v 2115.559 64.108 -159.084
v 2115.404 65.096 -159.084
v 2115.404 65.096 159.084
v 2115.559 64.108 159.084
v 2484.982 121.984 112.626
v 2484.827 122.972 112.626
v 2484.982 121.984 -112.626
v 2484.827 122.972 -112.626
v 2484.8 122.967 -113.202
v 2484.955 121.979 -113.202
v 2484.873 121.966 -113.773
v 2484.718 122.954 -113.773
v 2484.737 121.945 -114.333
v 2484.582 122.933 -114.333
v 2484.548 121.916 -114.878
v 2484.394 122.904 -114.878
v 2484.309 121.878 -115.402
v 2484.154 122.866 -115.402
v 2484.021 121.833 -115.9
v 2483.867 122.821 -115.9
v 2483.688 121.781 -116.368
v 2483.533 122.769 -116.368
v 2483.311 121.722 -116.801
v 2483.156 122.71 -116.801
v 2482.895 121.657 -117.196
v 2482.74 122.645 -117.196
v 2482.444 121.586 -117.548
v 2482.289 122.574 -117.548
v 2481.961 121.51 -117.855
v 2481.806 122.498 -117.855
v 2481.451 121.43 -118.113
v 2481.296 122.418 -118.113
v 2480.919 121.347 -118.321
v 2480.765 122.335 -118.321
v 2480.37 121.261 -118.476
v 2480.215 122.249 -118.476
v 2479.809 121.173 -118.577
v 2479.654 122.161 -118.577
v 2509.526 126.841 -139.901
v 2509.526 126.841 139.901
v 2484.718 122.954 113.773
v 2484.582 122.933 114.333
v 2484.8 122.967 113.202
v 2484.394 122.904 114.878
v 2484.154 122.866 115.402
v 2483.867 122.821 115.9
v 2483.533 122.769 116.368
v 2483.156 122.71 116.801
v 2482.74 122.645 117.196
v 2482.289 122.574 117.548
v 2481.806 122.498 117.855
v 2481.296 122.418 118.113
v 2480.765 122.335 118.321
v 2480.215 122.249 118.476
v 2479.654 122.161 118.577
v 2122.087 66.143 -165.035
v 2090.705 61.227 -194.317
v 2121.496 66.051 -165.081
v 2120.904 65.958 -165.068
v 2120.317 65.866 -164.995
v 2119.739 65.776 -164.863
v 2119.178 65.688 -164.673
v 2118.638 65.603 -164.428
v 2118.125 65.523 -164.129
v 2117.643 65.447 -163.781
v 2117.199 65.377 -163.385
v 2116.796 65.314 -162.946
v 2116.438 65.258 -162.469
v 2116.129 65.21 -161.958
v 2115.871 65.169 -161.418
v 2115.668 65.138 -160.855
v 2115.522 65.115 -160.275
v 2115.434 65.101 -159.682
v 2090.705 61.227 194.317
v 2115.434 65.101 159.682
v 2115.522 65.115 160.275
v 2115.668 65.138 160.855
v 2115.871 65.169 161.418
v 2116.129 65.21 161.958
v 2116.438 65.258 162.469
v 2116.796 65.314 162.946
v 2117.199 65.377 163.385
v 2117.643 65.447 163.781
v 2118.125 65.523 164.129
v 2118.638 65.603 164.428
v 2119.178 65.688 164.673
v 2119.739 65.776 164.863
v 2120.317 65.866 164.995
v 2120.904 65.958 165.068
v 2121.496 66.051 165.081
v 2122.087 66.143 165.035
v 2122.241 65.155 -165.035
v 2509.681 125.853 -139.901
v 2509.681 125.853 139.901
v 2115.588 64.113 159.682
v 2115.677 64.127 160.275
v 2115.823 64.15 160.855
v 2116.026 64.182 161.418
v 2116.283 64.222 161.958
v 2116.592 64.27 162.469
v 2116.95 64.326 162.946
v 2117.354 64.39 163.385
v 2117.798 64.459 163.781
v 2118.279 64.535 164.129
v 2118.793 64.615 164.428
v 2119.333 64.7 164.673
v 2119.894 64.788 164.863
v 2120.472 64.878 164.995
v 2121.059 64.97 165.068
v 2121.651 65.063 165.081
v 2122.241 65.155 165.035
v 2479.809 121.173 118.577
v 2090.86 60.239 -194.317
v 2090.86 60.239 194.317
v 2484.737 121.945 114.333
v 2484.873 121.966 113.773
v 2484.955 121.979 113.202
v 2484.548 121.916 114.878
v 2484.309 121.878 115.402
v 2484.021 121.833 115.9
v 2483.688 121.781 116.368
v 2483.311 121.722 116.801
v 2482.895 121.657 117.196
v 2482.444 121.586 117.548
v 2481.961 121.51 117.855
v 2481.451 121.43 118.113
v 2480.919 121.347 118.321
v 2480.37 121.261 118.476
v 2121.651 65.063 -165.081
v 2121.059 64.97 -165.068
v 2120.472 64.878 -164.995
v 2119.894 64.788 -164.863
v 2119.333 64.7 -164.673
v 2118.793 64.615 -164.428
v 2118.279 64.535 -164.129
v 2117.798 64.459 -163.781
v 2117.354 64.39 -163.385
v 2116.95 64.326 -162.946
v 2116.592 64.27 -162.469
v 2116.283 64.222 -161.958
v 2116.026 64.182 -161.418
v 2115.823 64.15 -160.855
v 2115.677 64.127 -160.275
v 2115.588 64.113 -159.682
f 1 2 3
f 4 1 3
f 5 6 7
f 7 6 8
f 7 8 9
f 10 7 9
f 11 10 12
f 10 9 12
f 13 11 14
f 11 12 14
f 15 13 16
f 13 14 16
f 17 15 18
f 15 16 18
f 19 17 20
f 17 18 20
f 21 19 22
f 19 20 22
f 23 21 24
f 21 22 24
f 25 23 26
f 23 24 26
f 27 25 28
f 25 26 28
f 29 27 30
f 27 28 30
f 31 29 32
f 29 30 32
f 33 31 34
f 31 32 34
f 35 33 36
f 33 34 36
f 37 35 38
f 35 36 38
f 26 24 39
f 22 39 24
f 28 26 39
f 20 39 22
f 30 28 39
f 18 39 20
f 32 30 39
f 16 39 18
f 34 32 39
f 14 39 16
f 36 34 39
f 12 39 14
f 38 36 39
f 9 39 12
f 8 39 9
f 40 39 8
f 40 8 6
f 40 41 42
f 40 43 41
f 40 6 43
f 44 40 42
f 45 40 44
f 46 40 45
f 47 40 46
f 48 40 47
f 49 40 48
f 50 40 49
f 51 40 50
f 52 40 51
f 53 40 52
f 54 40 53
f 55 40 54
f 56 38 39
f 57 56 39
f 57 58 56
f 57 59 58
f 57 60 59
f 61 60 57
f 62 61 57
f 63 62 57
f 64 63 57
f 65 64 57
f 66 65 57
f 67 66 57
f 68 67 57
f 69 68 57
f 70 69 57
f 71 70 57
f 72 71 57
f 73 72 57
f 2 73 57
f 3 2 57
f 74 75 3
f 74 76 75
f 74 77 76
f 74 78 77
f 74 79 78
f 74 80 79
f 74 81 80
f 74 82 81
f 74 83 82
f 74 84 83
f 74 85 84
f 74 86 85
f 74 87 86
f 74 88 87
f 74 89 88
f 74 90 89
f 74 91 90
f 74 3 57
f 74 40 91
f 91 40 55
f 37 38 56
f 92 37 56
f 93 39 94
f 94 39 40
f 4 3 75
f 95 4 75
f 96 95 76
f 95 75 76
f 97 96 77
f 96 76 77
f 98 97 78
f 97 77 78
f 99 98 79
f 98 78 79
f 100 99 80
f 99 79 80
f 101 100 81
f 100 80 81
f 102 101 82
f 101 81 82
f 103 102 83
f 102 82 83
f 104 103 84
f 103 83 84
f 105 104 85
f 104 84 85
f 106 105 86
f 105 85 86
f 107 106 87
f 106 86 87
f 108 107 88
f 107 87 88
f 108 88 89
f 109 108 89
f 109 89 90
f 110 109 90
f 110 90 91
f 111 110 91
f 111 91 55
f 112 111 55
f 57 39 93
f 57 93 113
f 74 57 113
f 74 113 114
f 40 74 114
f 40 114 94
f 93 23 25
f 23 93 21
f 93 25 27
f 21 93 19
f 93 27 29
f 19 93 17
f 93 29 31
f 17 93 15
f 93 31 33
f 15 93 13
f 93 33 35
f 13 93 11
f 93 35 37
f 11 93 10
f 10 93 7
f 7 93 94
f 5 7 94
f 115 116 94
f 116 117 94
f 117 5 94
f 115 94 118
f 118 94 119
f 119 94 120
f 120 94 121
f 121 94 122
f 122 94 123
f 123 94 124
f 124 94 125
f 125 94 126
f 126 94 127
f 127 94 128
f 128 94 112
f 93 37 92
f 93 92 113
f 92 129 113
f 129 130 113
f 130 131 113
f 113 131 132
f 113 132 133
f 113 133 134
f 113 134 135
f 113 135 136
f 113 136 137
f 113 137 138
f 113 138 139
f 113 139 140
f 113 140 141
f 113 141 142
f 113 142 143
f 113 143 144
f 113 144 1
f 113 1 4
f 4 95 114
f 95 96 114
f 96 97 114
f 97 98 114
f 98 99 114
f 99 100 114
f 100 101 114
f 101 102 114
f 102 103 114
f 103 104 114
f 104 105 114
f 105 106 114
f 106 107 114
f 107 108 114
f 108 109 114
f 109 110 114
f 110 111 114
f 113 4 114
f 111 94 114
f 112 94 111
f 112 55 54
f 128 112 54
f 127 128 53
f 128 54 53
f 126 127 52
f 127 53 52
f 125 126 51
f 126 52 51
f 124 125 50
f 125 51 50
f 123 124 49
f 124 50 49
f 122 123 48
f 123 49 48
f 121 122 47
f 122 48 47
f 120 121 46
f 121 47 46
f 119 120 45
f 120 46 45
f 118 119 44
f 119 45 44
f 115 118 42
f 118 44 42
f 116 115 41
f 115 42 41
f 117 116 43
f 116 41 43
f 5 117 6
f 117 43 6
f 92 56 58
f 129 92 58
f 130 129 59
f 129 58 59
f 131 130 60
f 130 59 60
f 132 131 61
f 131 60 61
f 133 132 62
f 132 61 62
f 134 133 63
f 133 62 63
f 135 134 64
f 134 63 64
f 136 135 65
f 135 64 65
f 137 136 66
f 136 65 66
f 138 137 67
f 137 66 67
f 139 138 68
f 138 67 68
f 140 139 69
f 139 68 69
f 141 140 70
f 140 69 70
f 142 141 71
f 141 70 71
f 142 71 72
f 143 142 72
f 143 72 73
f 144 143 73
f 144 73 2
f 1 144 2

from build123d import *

# Parameters (mm, degrees)
BOSS_EXTRUDE1_DEPTH = 1


with BuildPart() as part:
    # Sketch1 → Boss-Extrude1 (new body)
    with BuildSketch(Plane(origin=(40.721862841, -259.93142883, 0), x_dir=(0.987949588, 0.154776003, 0), z_dir=(0.154776003, -0.987949588, 0))):
        Polygon((2498.917023581, -58.444774641), (2498.917023581, -139.900786314), (2074.988000168, -194.317166252), (2074.988000168, 194.317166252), (2498.917023581, 139.900786314), (2498.917023581, 58.444774641), align=None)
        with BuildLine():
            Line((2473.917023581, -58.444774641), (2473.917023581, -112.625661461))
            ThreePointArc((2473.917023581, -112.625661461), (2472.421655996, -116.589029575), (2468.680927979, -118.57683362))
            Line((2468.680927979, -118.57683362), (2106.751904566, -165.034769173))
            ThreePointArc((2106.751904566, -165.034769173), (2102.024632054, -163.588229428), (2099.988000168, -159.083597013))
            Line((2099.988000168, -159.083597013), (2099.988000168, 159.083597013))
            ThreePointArc((2099.988000168, 159.083597013), (2102.024632054, 163.588229428), (2106.751904566, 165.034769173))
            Line((2106.751904566, 165.034769173), (2468.680927979, 118.57683362))
            ThreePointArc((2468.680927979, 118.57683362), (2472.421655996, 116.589029575), (2473.917023581, 112.625661461))
            Line((2473.917023581, 112.625661461), (2473.917023581, 58.444774641))
            Line((2473.917023581, 58.444774641), (2473.917023581, -58.444774641))
        make_face(mode=Mode.SUBTRACT)
    extrude(amount=BOSS_EXTRUDE1_DEPTH)


solid = part.part
